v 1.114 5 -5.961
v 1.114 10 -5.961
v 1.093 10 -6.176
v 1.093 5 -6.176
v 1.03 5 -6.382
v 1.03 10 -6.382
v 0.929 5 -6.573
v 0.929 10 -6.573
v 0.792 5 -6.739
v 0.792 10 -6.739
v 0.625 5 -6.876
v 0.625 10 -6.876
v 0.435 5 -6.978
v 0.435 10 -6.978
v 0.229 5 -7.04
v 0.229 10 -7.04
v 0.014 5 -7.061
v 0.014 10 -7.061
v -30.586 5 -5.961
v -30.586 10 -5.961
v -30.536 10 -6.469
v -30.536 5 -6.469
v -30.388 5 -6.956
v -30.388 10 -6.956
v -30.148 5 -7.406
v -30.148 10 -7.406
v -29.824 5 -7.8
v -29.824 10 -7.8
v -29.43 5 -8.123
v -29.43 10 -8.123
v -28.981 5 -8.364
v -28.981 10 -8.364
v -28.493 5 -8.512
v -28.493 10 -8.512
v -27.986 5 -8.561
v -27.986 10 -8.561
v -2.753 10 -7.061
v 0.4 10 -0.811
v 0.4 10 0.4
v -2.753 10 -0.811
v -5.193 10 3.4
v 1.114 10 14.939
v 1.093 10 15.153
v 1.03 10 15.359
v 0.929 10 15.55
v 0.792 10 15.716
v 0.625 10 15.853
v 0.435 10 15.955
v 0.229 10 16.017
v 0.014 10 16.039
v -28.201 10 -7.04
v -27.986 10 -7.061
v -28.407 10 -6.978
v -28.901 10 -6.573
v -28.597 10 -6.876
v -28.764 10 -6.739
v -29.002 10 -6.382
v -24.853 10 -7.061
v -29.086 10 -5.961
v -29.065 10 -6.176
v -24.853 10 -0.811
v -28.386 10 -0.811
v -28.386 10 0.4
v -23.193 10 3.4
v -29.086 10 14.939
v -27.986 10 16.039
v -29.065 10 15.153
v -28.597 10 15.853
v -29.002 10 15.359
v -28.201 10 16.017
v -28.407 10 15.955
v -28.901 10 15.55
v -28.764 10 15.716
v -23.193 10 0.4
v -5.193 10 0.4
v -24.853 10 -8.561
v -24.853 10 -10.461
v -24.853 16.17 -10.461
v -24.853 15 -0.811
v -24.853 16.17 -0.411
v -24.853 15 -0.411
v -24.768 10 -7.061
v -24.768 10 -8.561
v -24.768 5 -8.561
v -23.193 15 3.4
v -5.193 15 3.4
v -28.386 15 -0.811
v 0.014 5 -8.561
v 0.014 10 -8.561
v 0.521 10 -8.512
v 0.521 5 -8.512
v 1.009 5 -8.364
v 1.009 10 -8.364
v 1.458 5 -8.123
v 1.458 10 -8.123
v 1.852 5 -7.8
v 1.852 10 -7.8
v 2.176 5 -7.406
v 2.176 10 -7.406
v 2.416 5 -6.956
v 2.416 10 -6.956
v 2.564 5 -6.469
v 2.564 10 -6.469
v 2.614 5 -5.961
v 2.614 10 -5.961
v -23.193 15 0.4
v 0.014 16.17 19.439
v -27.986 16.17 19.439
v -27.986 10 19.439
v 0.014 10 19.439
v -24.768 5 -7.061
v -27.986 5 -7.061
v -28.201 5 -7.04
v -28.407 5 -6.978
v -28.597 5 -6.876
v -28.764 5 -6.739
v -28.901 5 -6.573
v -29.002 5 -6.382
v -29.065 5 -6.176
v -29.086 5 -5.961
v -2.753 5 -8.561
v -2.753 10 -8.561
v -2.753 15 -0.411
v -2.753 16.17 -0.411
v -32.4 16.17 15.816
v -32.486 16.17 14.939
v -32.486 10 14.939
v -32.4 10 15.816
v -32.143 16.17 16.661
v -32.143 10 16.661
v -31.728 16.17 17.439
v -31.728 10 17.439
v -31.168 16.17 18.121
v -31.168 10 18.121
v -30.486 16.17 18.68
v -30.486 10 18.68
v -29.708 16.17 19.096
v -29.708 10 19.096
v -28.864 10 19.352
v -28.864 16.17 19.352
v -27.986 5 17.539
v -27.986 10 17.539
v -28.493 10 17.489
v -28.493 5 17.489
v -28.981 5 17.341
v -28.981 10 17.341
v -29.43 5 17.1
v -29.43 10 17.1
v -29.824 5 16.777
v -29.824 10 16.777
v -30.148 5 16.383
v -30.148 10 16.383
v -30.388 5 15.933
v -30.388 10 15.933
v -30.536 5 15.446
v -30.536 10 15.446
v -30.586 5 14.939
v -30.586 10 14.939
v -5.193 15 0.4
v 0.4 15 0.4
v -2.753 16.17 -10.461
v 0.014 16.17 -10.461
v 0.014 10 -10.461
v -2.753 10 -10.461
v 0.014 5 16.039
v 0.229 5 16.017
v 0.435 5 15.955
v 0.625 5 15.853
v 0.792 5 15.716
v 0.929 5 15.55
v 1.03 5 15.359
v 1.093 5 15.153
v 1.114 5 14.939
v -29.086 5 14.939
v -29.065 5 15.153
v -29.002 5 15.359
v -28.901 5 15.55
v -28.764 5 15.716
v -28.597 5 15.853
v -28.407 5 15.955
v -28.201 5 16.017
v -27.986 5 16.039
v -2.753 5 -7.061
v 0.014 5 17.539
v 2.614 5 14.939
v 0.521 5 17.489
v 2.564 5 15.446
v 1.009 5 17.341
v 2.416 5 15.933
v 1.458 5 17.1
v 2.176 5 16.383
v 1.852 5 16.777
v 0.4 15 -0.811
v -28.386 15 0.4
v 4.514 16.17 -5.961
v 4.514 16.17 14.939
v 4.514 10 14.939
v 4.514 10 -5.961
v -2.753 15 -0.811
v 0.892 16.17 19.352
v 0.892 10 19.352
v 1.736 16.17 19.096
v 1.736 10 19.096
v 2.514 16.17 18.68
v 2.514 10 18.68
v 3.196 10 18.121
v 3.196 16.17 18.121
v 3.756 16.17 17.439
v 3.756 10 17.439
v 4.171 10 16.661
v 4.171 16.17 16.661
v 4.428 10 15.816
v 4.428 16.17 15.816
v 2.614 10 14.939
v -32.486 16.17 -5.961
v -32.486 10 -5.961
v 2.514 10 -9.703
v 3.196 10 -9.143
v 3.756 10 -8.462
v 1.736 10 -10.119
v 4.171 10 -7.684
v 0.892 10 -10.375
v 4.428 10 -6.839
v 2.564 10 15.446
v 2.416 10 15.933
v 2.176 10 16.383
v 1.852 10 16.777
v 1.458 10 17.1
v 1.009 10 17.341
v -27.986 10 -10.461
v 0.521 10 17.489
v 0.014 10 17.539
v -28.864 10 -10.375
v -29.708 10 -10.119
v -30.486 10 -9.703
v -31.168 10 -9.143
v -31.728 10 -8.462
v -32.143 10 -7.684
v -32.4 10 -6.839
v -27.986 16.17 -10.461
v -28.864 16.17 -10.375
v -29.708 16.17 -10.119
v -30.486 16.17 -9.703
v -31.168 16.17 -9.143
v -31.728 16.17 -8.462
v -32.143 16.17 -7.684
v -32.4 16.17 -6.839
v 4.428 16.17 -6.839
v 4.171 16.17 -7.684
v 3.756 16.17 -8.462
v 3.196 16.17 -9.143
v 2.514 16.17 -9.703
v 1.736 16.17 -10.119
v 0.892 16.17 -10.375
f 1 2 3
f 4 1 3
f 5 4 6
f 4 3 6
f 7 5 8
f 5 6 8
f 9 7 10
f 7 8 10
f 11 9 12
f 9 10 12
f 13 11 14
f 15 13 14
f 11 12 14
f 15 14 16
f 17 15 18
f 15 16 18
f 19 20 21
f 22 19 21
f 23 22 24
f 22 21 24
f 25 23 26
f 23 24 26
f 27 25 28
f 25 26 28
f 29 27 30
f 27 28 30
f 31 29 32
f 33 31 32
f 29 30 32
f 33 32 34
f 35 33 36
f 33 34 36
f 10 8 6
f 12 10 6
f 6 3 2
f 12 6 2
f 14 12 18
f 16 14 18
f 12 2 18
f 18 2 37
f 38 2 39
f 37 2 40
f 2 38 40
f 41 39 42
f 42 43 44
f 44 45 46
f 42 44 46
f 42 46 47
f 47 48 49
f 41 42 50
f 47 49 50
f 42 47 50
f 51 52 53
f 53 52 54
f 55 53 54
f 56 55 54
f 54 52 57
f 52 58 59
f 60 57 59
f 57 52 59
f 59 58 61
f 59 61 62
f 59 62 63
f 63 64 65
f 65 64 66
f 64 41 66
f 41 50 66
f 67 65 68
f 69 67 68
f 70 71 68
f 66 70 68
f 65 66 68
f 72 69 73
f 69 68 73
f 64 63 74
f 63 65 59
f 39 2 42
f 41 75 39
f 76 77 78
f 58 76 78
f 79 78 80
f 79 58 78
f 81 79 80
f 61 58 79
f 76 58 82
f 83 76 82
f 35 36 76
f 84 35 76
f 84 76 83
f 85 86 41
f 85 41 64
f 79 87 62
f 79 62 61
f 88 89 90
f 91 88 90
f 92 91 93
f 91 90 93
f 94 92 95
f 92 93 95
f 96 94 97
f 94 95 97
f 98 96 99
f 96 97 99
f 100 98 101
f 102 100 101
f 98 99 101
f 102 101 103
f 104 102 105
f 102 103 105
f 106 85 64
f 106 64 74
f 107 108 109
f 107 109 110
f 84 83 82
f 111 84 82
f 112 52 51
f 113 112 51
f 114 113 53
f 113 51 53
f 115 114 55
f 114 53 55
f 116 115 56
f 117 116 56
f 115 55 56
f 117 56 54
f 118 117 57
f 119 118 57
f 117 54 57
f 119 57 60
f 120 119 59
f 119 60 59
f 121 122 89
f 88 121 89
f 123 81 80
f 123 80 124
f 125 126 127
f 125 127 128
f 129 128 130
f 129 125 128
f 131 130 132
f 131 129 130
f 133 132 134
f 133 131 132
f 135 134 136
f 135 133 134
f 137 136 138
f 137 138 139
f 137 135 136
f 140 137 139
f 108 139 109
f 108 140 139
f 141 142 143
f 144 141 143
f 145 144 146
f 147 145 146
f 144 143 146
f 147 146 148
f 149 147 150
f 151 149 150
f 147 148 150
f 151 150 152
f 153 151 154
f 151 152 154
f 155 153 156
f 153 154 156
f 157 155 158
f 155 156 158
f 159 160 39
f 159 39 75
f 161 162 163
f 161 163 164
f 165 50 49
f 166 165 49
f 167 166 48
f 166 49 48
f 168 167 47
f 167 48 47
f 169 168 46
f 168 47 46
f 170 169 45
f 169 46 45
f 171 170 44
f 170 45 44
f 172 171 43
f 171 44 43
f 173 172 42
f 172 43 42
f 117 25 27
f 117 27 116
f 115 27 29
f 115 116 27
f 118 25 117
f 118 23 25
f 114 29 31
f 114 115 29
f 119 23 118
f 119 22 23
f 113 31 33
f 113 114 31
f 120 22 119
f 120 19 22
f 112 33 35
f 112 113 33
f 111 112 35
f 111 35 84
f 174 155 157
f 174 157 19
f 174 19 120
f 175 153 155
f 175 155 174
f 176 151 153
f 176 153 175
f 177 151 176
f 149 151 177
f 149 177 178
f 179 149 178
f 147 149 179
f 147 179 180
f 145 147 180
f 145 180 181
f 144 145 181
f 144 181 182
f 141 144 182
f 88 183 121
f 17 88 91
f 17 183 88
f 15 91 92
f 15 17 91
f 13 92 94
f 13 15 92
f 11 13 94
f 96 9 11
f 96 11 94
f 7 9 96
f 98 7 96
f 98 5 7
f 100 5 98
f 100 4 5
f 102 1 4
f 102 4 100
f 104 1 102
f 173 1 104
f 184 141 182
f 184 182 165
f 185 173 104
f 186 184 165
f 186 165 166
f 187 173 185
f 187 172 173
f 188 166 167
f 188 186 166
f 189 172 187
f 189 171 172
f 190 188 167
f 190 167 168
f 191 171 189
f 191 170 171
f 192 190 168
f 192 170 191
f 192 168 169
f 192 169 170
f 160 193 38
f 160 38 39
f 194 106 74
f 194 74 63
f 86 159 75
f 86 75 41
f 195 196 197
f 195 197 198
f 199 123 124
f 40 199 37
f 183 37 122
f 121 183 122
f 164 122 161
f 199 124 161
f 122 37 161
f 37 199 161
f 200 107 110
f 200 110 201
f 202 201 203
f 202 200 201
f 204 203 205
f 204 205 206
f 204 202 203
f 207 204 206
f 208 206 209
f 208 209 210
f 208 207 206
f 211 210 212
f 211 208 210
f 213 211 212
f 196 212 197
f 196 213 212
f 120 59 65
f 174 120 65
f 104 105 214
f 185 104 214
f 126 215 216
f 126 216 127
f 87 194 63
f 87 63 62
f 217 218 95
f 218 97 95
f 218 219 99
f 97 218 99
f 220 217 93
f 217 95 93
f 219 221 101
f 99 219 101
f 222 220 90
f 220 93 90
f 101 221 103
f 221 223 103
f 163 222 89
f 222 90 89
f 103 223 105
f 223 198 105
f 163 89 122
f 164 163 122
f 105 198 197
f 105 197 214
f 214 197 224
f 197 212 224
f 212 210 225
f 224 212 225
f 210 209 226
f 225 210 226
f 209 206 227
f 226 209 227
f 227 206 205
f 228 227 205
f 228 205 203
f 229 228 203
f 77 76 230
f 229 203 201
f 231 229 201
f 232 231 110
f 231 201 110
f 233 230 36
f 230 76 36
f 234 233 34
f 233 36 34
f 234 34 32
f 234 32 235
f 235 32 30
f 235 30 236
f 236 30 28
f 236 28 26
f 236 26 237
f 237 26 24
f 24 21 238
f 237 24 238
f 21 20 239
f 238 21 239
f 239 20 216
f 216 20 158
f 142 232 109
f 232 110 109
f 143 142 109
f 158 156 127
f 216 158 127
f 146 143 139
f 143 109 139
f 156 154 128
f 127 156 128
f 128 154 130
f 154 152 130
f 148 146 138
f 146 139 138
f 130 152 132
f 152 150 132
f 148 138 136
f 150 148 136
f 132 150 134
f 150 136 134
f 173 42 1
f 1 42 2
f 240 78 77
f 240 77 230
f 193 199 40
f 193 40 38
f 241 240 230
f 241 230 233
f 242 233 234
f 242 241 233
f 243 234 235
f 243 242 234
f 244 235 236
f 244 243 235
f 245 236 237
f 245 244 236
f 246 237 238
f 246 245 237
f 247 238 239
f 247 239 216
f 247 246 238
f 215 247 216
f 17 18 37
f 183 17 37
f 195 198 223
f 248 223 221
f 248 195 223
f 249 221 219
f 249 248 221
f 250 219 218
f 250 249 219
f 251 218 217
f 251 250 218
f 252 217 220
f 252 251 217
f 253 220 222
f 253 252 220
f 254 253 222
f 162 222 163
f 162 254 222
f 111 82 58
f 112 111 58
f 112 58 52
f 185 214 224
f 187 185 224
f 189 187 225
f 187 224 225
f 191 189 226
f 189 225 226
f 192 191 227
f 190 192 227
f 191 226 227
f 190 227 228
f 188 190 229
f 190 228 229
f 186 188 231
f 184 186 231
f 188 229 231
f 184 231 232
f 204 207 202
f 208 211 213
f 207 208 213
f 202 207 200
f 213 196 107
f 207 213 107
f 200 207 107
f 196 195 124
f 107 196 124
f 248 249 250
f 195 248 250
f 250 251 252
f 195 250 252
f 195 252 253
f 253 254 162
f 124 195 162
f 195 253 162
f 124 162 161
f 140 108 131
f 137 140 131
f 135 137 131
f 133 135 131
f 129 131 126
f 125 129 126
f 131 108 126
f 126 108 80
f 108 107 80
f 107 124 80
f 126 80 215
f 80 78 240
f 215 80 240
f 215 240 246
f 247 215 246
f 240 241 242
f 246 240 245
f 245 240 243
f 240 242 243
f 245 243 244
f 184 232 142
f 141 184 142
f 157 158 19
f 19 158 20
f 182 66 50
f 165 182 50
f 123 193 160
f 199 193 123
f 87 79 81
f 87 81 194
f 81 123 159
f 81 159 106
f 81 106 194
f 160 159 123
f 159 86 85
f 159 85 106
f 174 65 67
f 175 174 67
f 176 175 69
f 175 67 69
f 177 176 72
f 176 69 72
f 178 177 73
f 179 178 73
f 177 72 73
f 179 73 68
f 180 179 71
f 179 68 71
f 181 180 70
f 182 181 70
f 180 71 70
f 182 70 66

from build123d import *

# Parameters (mm, degrees)
EXTRUDE_3_DEPTH = 1.169927
EXTRUDE_4_DEPTH = 5
EXTRUDE_5_DEPTH = 5


with BuildPart() as part:
    # 草图2 → 凸台-拉伸3 (new body)
    with BuildSketch(Plane(origin=(0, 15, 0), x_dir=(1, 0, 0), z_dir=(0, 1, 0))):
        with BuildLine():
            Line((-24.853345035, 10.461479878), (-24.853345035, 0.41148))
            Line((-24.853345035, 0.41148), (-2.753344966, 0.41148))
            Line((-2.753344966, 0.41148), (-2.753344966, 10.461479878))
            Line((-2.753344966, 10.461479878), (0.013999939, 10.461479878))
            ThreePointArc((0.013999939, 10.461479878), (3.195980454, 9.143460393), (4.513999939, 5.961479878))
            Line((4.513999939, 5.961479878), (4.513999939, -14.938520122))
            ThreePointArc((4.513999939, -14.938520122), (3.195980454, -18.120500638), (0.013999939, -19.438520122))
            Line((0.013999939, -19.438520122), (-27.986000061, -19.438520122))
            ThreePointArc((-27.986000061, -19.438520122), (-31.167980576, -18.120500638), (-32.486000061, -14.938520122))
            Line((-32.486000061, -14.938520122), (-32.486000061, 5.961479878))
            ThreePointArc((-32.486000061, 5.961479878), (-31.167980576, 9.143460393), (-27.986000061, 10.461479878))
            Line((-27.986000061, 10.461479878), (-24.853345035, 10.461479878))
        make_face()
    extrude(amount=EXTRUDE_3_DEPTH)

    # 草图4 → 凸台-拉伸4 (add)
    with BuildSketch(Plane.XZ.offset(-15)):
        with BuildLine():
            Line((-23.193000031, 0.4), (-28.386000061, 0.4))
            Line((-28.386000061, 0.4), (-28.386000061, -0.81148))
            Line((-28.386000061, -0.81148), (-24.853345035, -0.81148))
            Line((-24.853345035, -0.81148), (-24.853345035, -10.461479878))
            Line((-24.853345035, -10.461479878), (-27.986000061, -10.461479878))
            ThreePointArc((-27.986000061, -10.461479878), (-31.167980576, -9.143460393), (-32.486000061, -5.961479878))
            Line((-32.486000061, -5.961479878), (-32.486000061, 14.938520122))
            ThreePointArc((-32.486000061, 14.938520122), (-31.167980576, 18.120500638), (-27.986000061, 19.438520122))
            Line((-27.986000061, 19.438520122), (0.013999939, 19.438520122))
            ThreePointArc((0.013999939, 19.438520122), (3.195980454, 18.120500638), (4.513999939, 14.938520122))
            Line((4.513999939, 14.938520122), (4.513999939, -5.961479878))
            ThreePointArc((4.513999939, -5.961479878), (3.195980454, -9.143460393), (0.013999939, -10.461479878))
            Line((0.013999939, -10.461479878), (-2.753344966, -10.461479878))
            Line((-2.753344966, -10.461479878), (-2.753344966, -0.81148))
            Line((-2.753344966, -0.81148), (0.4, -0.81148))
            Line((0.4, -0.81148), (0.4, 0.4))
            Line((0.4, 0.4), (-5.193000031, 0.4))
            Line((-5.193000031, 0.4), (-5.193000031, 3.4))
            Line((-5.193000031, 3.4), (-23.193000031, 3.4))
            Line((-23.193000031, 3.4), (-23.193000031, 0.4))
        make_face()
    extrude(amount=EXTRUDE_4_DEPTH)

    # 草图5 → 凸台-拉伸5 (add)
    with BuildSketch(Plane.XZ.offset(-10)):
        with BuildLine():
            Line((-2.753344966, -8.561479878), (0.013999939, -8.561479878))
            ThreePointArc((0.013999939, -8.561479878), (1.85247757, -7.799957509), (2.613999939, -5.961479878))
            Line((2.613999939, -5.961479878), (2.613999939, 14.938520122))
            ThreePointArc((2.613999939, 14.938520122), (1.85247757, 16.776997753), (0.013999939, 17.538520122))
            Line((0.013999939, 17.538520122), (-27.986000061, 17.538520122))
            ThreePointArc((-27.986000061, 17.538520122), (-29.824477692, 16.776997753), (-30.586000061, 14.938520122))
            Line((-30.586000061, 14.938520122), (-30.586000061, -5.961479878))
            ThreePointArc((-30.586000061, -5.961479878), (-29.824477692, -7.799957509), (-27.986000061, -8.561479878))
            Line((-27.986000061, -8.561479878), (-24.768224203, -8.561479878))
            Line((-24.768224203, -8.561479878), (-24.768224203, -7.061479878))
            Line((-24.768224203, -7.061479878), (-27.986000061, -7.061479878))
            ThreePointArc((-27.986000061, -7.061479878), (-28.76381752, -6.739297337), (-29.086000061, -5.961479878))
            Line((-29.086000061, -5.961479878), (-29.086000061, 14.938520122))
            ThreePointArc((-29.086000061, 14.938520122), (-28.76381752, 15.716337581), (-27.986000061, 16.038520122))
            Line((-27.986000061, 16.038520122), (0.013999939, 16.038520122))
            ThreePointArc((0.013999939, 16.038520122), (0.791817398, 15.716337581), (1.113999939, 14.938520122))
            Line((1.113999939, 14.938520122), (1.113999939, -5.961479878))
            ThreePointArc((1.113999939, -5.961479878), (0.791817398, -6.739297337), (0.013999939, -7.061479878))
            Line((0.013999939, -7.061479878), (-2.753344966, -7.061479878))
            Line((-2.753344966, -7.061479878), (-2.753344966, -8.561479878))
        make_face()
    extrude(amount=EXTRUDE_5_DEPTH)


solid = part.part
